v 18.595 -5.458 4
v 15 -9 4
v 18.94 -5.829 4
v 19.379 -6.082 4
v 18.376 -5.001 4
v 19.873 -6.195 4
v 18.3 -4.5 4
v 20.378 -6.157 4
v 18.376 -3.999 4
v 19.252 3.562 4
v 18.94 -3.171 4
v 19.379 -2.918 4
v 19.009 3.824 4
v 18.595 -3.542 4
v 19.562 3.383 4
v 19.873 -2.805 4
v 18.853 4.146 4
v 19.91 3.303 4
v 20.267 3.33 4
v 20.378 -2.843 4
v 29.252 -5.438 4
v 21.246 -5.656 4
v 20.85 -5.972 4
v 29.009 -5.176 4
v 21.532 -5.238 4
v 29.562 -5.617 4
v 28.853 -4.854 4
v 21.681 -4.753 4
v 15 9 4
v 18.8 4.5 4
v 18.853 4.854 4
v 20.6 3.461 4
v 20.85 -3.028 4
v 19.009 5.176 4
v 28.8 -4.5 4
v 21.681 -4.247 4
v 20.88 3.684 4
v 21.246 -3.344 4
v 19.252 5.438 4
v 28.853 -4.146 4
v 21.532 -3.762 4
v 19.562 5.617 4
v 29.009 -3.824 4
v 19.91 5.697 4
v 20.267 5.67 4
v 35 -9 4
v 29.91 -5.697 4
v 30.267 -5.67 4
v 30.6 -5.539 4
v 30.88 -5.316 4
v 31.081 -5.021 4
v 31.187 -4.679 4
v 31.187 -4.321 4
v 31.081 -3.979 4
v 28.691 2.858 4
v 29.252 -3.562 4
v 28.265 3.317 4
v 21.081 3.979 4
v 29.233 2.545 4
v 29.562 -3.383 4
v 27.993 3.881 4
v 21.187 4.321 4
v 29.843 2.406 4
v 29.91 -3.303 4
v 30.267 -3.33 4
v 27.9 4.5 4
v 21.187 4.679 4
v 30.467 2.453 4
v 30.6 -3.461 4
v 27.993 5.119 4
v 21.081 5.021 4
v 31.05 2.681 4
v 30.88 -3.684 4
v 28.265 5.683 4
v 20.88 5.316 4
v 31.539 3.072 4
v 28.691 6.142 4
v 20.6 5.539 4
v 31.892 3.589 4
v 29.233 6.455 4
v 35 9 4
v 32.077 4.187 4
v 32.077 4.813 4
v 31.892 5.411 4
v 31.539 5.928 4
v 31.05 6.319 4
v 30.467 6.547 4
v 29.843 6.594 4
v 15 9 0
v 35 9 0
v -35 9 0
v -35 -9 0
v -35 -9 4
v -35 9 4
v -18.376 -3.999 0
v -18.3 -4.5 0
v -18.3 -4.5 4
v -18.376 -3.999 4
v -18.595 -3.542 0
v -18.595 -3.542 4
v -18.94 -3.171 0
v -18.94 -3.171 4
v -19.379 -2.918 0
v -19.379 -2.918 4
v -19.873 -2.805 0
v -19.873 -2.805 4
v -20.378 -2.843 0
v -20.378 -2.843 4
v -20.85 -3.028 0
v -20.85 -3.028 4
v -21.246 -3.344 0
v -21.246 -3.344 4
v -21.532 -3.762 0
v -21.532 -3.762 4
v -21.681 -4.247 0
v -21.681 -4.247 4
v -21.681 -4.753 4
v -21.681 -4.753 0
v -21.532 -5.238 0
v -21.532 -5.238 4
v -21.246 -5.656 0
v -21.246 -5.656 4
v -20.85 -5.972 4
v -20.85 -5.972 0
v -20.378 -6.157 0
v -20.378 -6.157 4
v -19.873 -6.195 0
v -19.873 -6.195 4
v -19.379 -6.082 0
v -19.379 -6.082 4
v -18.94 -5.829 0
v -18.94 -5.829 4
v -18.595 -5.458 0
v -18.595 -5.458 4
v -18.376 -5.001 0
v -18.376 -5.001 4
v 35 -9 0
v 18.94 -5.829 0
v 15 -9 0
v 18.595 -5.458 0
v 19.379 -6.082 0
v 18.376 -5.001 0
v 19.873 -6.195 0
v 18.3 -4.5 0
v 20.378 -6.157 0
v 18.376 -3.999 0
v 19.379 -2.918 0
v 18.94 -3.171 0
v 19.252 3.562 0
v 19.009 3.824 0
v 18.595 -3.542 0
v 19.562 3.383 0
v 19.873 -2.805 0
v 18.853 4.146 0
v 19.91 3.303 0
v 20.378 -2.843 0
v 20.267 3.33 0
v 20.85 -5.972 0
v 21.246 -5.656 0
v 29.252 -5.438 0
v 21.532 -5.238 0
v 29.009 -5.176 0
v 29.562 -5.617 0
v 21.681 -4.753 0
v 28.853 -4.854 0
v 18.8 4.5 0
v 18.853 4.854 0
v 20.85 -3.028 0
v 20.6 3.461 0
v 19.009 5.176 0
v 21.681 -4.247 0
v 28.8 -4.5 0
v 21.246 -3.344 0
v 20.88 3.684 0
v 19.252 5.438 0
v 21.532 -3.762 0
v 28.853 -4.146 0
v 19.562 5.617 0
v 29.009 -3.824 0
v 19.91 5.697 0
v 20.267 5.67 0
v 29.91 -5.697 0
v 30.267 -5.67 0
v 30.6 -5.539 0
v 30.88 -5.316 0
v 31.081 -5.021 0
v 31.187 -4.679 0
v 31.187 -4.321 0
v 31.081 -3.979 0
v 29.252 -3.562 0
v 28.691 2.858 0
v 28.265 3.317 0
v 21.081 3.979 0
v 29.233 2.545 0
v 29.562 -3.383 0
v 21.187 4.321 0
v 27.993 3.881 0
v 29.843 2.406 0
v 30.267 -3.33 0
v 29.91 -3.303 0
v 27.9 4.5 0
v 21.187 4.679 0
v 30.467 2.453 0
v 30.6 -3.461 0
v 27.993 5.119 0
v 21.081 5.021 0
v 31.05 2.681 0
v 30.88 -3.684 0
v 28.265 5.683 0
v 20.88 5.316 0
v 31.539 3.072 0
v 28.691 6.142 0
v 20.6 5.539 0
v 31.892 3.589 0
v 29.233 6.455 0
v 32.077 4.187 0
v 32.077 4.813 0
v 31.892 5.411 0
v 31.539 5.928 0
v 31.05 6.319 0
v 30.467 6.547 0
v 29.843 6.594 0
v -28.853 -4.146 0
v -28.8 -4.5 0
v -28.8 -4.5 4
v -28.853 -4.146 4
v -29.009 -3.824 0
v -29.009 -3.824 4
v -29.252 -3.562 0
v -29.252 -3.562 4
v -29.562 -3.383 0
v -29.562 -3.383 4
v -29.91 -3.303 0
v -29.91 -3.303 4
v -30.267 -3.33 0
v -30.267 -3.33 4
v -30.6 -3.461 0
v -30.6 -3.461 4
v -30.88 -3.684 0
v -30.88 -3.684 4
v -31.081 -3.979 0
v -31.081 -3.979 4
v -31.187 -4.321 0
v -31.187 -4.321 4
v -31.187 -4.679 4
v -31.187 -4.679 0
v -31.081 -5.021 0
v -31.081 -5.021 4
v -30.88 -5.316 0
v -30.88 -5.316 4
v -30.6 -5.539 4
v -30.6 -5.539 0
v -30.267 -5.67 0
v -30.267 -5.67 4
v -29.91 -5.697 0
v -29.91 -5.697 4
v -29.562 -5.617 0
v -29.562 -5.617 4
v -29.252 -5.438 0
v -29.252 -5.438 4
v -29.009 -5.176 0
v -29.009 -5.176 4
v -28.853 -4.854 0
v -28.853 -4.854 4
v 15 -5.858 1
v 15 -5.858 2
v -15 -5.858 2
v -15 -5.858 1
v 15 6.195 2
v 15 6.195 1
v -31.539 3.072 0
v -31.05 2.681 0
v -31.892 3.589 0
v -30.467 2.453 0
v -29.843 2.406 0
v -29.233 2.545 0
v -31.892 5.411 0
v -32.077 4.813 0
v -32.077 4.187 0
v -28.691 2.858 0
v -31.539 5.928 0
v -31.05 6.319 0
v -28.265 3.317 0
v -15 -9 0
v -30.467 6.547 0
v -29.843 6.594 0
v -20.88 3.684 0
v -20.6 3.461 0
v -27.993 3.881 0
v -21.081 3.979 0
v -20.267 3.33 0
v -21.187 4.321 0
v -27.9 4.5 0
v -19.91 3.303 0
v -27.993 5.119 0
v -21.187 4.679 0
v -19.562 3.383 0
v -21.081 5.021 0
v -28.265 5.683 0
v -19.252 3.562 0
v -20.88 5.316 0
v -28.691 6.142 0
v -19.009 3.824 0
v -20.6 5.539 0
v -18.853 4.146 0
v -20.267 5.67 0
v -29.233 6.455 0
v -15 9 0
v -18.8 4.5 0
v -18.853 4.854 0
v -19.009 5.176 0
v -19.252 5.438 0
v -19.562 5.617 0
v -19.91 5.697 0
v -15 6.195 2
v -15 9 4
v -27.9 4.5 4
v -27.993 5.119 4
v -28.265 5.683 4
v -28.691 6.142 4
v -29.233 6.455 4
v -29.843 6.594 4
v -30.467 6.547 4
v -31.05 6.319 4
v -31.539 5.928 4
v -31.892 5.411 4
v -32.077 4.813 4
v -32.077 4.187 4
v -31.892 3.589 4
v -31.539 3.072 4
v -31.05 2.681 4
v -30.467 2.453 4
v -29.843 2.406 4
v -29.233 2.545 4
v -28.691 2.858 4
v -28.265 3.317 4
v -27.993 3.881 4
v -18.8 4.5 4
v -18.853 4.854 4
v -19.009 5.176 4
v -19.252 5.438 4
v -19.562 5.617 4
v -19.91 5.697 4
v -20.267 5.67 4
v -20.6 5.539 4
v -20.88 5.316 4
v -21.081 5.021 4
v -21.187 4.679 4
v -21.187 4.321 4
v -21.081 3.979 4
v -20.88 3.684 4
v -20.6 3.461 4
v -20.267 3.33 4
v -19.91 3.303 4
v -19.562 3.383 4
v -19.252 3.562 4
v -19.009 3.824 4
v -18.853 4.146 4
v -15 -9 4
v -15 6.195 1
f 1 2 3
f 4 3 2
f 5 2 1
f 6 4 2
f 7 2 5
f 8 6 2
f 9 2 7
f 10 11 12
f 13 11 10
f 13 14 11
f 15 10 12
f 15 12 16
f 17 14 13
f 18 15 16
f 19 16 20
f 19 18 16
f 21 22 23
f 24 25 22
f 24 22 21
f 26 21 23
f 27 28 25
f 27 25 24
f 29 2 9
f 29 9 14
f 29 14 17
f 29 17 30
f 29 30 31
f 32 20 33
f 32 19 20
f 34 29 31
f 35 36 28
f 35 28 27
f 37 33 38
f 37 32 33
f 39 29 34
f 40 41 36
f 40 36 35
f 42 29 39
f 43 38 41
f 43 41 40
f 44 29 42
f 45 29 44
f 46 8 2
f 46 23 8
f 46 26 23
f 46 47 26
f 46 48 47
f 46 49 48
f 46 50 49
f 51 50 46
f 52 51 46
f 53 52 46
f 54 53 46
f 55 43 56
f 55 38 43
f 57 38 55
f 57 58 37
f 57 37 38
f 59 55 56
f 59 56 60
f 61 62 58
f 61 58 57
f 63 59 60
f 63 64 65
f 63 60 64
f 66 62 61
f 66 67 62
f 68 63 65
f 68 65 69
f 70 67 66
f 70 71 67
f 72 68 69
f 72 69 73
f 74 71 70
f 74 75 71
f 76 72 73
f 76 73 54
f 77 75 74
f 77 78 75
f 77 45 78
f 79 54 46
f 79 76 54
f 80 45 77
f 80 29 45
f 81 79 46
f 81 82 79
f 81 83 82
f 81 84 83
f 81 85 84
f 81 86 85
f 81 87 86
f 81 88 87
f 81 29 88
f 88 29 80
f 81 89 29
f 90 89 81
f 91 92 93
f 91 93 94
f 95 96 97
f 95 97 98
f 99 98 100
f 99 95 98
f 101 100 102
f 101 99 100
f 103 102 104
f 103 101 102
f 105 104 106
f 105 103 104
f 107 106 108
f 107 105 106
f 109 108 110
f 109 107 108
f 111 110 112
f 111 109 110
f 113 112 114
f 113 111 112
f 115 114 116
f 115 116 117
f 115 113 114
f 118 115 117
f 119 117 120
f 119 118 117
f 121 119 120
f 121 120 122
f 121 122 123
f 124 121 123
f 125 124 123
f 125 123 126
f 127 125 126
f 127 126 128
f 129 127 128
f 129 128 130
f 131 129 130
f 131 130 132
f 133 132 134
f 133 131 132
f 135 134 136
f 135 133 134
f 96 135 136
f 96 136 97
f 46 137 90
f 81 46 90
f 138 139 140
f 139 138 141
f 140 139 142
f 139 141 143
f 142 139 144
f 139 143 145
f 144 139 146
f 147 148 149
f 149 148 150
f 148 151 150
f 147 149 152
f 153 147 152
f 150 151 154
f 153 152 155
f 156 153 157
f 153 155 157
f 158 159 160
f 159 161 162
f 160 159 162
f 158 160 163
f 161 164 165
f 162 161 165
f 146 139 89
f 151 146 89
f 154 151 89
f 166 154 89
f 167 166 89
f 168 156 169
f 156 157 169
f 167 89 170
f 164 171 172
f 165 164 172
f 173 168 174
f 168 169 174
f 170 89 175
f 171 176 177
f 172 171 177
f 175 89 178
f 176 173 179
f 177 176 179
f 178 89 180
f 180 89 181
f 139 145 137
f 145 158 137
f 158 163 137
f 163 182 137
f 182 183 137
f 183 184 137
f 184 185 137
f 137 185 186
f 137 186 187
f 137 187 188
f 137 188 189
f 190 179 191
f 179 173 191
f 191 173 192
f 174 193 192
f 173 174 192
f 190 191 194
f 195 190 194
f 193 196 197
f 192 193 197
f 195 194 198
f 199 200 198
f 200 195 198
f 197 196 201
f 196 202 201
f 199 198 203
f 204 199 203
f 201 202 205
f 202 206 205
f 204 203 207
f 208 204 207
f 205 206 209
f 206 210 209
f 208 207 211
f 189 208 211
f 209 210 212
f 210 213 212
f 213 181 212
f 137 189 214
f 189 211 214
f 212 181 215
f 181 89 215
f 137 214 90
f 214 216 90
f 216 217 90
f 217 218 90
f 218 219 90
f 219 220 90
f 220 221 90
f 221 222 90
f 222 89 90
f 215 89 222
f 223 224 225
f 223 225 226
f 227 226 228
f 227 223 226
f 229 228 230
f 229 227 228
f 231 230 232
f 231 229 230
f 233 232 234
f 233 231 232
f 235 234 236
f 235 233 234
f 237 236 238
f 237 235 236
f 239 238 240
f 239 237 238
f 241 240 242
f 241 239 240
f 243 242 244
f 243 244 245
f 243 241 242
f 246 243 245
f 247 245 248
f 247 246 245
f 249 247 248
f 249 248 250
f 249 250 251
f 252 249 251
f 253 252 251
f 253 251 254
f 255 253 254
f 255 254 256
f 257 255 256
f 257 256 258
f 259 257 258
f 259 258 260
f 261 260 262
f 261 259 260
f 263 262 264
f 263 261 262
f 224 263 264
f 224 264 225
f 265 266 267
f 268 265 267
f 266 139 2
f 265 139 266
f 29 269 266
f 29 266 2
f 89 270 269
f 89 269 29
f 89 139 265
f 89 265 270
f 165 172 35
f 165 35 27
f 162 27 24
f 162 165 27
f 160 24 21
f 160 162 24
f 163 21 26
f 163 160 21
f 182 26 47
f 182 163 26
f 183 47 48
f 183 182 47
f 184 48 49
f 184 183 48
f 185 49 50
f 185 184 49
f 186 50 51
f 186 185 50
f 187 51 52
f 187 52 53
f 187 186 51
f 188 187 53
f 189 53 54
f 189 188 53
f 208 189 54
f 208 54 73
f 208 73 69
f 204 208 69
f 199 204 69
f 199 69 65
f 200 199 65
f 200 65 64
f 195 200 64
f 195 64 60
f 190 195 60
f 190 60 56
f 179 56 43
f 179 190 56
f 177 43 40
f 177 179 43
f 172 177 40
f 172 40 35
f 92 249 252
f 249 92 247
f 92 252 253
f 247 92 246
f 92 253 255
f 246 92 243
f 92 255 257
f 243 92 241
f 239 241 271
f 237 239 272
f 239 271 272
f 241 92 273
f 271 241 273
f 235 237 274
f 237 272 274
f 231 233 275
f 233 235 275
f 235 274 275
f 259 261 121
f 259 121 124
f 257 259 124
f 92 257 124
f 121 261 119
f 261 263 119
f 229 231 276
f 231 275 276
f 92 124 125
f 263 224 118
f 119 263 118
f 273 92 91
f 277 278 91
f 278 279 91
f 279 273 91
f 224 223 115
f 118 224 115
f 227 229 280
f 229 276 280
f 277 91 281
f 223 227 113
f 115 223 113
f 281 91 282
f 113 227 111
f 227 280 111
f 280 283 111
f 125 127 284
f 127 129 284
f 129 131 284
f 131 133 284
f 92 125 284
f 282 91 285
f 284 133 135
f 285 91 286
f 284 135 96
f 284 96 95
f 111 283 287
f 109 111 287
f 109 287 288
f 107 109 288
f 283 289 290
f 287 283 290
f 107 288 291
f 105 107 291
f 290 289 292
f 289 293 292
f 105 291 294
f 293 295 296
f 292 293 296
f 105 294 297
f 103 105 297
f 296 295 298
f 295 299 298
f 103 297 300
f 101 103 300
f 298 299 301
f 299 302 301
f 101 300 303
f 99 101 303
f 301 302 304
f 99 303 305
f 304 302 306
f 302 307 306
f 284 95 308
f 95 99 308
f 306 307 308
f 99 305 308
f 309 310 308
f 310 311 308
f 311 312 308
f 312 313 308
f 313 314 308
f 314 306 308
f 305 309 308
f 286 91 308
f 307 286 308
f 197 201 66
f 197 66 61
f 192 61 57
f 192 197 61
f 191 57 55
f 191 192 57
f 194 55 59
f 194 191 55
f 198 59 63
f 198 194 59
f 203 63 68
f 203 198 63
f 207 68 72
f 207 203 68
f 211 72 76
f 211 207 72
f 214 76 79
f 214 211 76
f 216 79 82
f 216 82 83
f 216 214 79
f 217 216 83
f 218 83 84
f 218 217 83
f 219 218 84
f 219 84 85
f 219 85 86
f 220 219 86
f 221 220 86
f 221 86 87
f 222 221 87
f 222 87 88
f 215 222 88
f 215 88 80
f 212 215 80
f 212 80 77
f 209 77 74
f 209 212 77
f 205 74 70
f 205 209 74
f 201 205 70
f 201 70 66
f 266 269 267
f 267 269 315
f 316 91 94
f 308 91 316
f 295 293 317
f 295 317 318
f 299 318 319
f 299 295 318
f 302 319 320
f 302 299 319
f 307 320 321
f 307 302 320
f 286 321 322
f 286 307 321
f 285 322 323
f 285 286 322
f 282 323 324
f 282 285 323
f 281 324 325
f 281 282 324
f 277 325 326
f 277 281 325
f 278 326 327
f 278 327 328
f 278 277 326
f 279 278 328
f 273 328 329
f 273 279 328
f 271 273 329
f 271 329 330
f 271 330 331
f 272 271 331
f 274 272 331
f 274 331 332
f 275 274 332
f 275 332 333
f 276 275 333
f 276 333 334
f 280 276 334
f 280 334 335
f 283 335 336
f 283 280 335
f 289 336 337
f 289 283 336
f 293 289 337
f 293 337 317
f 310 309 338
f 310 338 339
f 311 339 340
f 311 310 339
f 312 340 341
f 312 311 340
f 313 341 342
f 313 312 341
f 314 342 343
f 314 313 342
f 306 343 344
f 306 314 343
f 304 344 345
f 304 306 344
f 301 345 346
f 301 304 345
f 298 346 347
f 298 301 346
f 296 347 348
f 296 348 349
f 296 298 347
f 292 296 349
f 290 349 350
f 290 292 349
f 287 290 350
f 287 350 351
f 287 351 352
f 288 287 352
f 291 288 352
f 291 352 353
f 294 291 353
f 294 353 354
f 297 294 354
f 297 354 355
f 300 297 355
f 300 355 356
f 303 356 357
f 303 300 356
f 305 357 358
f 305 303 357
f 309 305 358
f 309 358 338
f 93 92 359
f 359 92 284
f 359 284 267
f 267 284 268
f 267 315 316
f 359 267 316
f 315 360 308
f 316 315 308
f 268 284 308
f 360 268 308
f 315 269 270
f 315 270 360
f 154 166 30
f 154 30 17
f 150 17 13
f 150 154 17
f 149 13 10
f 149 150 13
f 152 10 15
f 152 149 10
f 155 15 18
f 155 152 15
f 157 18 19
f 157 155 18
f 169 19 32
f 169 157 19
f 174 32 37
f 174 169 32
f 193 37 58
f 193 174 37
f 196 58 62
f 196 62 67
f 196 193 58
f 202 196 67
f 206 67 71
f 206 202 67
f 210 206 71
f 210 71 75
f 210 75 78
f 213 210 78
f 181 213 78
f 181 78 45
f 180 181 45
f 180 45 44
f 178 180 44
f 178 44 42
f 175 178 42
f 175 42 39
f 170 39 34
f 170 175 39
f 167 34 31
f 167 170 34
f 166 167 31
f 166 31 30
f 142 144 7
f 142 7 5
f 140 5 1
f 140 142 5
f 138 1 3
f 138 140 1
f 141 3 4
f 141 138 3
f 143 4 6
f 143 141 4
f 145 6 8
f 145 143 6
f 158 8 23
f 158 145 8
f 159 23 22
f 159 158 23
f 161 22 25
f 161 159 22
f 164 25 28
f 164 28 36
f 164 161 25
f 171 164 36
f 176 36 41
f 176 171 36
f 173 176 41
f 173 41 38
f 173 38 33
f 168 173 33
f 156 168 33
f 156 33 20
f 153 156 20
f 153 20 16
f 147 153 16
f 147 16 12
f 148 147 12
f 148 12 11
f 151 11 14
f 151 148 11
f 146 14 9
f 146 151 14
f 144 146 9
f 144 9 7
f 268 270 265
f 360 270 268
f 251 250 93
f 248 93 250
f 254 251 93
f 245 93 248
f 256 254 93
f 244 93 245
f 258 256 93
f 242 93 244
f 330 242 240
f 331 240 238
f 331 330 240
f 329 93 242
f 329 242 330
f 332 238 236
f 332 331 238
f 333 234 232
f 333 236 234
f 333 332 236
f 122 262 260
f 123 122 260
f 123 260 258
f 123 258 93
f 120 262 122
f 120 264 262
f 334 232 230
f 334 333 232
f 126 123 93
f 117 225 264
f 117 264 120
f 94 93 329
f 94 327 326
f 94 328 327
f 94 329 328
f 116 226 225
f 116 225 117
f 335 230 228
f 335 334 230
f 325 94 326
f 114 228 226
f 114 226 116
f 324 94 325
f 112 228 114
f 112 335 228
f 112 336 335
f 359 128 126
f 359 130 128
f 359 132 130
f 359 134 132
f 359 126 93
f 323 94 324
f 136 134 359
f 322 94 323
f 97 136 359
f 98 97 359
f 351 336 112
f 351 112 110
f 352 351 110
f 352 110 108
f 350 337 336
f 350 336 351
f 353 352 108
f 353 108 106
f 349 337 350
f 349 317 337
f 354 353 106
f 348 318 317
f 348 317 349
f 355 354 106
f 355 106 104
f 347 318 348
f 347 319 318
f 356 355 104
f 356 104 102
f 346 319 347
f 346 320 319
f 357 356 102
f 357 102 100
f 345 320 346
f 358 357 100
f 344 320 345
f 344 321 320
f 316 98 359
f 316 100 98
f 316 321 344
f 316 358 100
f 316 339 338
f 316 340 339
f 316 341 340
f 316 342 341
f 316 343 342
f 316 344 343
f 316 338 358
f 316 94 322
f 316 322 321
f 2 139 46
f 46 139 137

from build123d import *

# Parameters (mm, degrees)
SKETCH_1_W        = 20
SKETCH_1_H        = 18
SKETCH_1_R        = 1.2
SKETCH_1_R_2      = 1.7
SKETCH_1_R_3      = 2.1
EXTRUDE_1_DEPTH   = 4
EXTRUDE_1_2_DEPTH = 4
SKETCH_2_W        = 33.123219373
SKETCH_2_H        = 12.052469136
EXTRUDE_2_DEPTH   = 1


with BuildPart() as part:
    # Эскиз1 → Вытянуть1 (new body)
    with BuildSketch(Plane.XY):
        with Locations((25, 0)):
            Rectangle(SKETCH_1_W, SKETCH_1_H)
        with Locations(Location((30, -4.5, 0), (0, 0, 180))):
            Circle(SKETCH_1_R, mode=Mode.SUBTRACT)
        with Locations(Location((20, -4.5, 0), (0, 0, 180))):
            Circle(SKETCH_1_R_2, mode=Mode.SUBTRACT)
        with Locations(Location((20, 4.5, 0), (0, 0, 180))):
            Circle(SKETCH_1_R, mode=Mode.SUBTRACT)
        with Locations(Location((30, 4.5, 0), (0, 0, 180))):
            Circle(SKETCH_1_R_3, mode=Mode.SUBTRACT)
    extrude(amount=EXTRUDE_1_DEPTH)



with BuildPart() as body_2:
    # Эскиз1 → Extrude 1 2 (new body)
    with BuildSketch(Plane.XY):
        with Locations((-25, 0)):
            Rectangle(SKETCH_1_W, SKETCH_1_H)
        with Locations((-30, 4.5)):
            Circle(SKETCH_1_R_3, mode=Mode.SUBTRACT)
        with Locations((-20, 4.5)):
            Circle(SKETCH_1_R, mode=Mode.SUBTRACT)
        with Locations((-20, -4.5)):
            Circle(SKETCH_1_R_2, mode=Mode.SUBTRACT)
        with Locations((-30, -4.5)):
            Circle(SKETCH_1_R, mode=Mode.SUBTRACT)
    extrude(amount=EXTRUDE_1_2_DEPTH)


with BuildPart() as part_1:
    add(part.part)

    add(body_2.part)  # Вытянуть2 merges body 2
    # Эскиз2 → Вытянуть2 (add)
    with BuildSketch(Plane(origin=(0, 0, 2), x_dir=(-1, 0, 0), z_dir=(0, 0, -1))):
        with Locations((0.036443495, 0.168566002)):
            Rectangle(SKETCH_2_W, SKETCH_2_H)
    extrude(amount=EXTRUDE_2_DEPTH)


solid = part_1.part
